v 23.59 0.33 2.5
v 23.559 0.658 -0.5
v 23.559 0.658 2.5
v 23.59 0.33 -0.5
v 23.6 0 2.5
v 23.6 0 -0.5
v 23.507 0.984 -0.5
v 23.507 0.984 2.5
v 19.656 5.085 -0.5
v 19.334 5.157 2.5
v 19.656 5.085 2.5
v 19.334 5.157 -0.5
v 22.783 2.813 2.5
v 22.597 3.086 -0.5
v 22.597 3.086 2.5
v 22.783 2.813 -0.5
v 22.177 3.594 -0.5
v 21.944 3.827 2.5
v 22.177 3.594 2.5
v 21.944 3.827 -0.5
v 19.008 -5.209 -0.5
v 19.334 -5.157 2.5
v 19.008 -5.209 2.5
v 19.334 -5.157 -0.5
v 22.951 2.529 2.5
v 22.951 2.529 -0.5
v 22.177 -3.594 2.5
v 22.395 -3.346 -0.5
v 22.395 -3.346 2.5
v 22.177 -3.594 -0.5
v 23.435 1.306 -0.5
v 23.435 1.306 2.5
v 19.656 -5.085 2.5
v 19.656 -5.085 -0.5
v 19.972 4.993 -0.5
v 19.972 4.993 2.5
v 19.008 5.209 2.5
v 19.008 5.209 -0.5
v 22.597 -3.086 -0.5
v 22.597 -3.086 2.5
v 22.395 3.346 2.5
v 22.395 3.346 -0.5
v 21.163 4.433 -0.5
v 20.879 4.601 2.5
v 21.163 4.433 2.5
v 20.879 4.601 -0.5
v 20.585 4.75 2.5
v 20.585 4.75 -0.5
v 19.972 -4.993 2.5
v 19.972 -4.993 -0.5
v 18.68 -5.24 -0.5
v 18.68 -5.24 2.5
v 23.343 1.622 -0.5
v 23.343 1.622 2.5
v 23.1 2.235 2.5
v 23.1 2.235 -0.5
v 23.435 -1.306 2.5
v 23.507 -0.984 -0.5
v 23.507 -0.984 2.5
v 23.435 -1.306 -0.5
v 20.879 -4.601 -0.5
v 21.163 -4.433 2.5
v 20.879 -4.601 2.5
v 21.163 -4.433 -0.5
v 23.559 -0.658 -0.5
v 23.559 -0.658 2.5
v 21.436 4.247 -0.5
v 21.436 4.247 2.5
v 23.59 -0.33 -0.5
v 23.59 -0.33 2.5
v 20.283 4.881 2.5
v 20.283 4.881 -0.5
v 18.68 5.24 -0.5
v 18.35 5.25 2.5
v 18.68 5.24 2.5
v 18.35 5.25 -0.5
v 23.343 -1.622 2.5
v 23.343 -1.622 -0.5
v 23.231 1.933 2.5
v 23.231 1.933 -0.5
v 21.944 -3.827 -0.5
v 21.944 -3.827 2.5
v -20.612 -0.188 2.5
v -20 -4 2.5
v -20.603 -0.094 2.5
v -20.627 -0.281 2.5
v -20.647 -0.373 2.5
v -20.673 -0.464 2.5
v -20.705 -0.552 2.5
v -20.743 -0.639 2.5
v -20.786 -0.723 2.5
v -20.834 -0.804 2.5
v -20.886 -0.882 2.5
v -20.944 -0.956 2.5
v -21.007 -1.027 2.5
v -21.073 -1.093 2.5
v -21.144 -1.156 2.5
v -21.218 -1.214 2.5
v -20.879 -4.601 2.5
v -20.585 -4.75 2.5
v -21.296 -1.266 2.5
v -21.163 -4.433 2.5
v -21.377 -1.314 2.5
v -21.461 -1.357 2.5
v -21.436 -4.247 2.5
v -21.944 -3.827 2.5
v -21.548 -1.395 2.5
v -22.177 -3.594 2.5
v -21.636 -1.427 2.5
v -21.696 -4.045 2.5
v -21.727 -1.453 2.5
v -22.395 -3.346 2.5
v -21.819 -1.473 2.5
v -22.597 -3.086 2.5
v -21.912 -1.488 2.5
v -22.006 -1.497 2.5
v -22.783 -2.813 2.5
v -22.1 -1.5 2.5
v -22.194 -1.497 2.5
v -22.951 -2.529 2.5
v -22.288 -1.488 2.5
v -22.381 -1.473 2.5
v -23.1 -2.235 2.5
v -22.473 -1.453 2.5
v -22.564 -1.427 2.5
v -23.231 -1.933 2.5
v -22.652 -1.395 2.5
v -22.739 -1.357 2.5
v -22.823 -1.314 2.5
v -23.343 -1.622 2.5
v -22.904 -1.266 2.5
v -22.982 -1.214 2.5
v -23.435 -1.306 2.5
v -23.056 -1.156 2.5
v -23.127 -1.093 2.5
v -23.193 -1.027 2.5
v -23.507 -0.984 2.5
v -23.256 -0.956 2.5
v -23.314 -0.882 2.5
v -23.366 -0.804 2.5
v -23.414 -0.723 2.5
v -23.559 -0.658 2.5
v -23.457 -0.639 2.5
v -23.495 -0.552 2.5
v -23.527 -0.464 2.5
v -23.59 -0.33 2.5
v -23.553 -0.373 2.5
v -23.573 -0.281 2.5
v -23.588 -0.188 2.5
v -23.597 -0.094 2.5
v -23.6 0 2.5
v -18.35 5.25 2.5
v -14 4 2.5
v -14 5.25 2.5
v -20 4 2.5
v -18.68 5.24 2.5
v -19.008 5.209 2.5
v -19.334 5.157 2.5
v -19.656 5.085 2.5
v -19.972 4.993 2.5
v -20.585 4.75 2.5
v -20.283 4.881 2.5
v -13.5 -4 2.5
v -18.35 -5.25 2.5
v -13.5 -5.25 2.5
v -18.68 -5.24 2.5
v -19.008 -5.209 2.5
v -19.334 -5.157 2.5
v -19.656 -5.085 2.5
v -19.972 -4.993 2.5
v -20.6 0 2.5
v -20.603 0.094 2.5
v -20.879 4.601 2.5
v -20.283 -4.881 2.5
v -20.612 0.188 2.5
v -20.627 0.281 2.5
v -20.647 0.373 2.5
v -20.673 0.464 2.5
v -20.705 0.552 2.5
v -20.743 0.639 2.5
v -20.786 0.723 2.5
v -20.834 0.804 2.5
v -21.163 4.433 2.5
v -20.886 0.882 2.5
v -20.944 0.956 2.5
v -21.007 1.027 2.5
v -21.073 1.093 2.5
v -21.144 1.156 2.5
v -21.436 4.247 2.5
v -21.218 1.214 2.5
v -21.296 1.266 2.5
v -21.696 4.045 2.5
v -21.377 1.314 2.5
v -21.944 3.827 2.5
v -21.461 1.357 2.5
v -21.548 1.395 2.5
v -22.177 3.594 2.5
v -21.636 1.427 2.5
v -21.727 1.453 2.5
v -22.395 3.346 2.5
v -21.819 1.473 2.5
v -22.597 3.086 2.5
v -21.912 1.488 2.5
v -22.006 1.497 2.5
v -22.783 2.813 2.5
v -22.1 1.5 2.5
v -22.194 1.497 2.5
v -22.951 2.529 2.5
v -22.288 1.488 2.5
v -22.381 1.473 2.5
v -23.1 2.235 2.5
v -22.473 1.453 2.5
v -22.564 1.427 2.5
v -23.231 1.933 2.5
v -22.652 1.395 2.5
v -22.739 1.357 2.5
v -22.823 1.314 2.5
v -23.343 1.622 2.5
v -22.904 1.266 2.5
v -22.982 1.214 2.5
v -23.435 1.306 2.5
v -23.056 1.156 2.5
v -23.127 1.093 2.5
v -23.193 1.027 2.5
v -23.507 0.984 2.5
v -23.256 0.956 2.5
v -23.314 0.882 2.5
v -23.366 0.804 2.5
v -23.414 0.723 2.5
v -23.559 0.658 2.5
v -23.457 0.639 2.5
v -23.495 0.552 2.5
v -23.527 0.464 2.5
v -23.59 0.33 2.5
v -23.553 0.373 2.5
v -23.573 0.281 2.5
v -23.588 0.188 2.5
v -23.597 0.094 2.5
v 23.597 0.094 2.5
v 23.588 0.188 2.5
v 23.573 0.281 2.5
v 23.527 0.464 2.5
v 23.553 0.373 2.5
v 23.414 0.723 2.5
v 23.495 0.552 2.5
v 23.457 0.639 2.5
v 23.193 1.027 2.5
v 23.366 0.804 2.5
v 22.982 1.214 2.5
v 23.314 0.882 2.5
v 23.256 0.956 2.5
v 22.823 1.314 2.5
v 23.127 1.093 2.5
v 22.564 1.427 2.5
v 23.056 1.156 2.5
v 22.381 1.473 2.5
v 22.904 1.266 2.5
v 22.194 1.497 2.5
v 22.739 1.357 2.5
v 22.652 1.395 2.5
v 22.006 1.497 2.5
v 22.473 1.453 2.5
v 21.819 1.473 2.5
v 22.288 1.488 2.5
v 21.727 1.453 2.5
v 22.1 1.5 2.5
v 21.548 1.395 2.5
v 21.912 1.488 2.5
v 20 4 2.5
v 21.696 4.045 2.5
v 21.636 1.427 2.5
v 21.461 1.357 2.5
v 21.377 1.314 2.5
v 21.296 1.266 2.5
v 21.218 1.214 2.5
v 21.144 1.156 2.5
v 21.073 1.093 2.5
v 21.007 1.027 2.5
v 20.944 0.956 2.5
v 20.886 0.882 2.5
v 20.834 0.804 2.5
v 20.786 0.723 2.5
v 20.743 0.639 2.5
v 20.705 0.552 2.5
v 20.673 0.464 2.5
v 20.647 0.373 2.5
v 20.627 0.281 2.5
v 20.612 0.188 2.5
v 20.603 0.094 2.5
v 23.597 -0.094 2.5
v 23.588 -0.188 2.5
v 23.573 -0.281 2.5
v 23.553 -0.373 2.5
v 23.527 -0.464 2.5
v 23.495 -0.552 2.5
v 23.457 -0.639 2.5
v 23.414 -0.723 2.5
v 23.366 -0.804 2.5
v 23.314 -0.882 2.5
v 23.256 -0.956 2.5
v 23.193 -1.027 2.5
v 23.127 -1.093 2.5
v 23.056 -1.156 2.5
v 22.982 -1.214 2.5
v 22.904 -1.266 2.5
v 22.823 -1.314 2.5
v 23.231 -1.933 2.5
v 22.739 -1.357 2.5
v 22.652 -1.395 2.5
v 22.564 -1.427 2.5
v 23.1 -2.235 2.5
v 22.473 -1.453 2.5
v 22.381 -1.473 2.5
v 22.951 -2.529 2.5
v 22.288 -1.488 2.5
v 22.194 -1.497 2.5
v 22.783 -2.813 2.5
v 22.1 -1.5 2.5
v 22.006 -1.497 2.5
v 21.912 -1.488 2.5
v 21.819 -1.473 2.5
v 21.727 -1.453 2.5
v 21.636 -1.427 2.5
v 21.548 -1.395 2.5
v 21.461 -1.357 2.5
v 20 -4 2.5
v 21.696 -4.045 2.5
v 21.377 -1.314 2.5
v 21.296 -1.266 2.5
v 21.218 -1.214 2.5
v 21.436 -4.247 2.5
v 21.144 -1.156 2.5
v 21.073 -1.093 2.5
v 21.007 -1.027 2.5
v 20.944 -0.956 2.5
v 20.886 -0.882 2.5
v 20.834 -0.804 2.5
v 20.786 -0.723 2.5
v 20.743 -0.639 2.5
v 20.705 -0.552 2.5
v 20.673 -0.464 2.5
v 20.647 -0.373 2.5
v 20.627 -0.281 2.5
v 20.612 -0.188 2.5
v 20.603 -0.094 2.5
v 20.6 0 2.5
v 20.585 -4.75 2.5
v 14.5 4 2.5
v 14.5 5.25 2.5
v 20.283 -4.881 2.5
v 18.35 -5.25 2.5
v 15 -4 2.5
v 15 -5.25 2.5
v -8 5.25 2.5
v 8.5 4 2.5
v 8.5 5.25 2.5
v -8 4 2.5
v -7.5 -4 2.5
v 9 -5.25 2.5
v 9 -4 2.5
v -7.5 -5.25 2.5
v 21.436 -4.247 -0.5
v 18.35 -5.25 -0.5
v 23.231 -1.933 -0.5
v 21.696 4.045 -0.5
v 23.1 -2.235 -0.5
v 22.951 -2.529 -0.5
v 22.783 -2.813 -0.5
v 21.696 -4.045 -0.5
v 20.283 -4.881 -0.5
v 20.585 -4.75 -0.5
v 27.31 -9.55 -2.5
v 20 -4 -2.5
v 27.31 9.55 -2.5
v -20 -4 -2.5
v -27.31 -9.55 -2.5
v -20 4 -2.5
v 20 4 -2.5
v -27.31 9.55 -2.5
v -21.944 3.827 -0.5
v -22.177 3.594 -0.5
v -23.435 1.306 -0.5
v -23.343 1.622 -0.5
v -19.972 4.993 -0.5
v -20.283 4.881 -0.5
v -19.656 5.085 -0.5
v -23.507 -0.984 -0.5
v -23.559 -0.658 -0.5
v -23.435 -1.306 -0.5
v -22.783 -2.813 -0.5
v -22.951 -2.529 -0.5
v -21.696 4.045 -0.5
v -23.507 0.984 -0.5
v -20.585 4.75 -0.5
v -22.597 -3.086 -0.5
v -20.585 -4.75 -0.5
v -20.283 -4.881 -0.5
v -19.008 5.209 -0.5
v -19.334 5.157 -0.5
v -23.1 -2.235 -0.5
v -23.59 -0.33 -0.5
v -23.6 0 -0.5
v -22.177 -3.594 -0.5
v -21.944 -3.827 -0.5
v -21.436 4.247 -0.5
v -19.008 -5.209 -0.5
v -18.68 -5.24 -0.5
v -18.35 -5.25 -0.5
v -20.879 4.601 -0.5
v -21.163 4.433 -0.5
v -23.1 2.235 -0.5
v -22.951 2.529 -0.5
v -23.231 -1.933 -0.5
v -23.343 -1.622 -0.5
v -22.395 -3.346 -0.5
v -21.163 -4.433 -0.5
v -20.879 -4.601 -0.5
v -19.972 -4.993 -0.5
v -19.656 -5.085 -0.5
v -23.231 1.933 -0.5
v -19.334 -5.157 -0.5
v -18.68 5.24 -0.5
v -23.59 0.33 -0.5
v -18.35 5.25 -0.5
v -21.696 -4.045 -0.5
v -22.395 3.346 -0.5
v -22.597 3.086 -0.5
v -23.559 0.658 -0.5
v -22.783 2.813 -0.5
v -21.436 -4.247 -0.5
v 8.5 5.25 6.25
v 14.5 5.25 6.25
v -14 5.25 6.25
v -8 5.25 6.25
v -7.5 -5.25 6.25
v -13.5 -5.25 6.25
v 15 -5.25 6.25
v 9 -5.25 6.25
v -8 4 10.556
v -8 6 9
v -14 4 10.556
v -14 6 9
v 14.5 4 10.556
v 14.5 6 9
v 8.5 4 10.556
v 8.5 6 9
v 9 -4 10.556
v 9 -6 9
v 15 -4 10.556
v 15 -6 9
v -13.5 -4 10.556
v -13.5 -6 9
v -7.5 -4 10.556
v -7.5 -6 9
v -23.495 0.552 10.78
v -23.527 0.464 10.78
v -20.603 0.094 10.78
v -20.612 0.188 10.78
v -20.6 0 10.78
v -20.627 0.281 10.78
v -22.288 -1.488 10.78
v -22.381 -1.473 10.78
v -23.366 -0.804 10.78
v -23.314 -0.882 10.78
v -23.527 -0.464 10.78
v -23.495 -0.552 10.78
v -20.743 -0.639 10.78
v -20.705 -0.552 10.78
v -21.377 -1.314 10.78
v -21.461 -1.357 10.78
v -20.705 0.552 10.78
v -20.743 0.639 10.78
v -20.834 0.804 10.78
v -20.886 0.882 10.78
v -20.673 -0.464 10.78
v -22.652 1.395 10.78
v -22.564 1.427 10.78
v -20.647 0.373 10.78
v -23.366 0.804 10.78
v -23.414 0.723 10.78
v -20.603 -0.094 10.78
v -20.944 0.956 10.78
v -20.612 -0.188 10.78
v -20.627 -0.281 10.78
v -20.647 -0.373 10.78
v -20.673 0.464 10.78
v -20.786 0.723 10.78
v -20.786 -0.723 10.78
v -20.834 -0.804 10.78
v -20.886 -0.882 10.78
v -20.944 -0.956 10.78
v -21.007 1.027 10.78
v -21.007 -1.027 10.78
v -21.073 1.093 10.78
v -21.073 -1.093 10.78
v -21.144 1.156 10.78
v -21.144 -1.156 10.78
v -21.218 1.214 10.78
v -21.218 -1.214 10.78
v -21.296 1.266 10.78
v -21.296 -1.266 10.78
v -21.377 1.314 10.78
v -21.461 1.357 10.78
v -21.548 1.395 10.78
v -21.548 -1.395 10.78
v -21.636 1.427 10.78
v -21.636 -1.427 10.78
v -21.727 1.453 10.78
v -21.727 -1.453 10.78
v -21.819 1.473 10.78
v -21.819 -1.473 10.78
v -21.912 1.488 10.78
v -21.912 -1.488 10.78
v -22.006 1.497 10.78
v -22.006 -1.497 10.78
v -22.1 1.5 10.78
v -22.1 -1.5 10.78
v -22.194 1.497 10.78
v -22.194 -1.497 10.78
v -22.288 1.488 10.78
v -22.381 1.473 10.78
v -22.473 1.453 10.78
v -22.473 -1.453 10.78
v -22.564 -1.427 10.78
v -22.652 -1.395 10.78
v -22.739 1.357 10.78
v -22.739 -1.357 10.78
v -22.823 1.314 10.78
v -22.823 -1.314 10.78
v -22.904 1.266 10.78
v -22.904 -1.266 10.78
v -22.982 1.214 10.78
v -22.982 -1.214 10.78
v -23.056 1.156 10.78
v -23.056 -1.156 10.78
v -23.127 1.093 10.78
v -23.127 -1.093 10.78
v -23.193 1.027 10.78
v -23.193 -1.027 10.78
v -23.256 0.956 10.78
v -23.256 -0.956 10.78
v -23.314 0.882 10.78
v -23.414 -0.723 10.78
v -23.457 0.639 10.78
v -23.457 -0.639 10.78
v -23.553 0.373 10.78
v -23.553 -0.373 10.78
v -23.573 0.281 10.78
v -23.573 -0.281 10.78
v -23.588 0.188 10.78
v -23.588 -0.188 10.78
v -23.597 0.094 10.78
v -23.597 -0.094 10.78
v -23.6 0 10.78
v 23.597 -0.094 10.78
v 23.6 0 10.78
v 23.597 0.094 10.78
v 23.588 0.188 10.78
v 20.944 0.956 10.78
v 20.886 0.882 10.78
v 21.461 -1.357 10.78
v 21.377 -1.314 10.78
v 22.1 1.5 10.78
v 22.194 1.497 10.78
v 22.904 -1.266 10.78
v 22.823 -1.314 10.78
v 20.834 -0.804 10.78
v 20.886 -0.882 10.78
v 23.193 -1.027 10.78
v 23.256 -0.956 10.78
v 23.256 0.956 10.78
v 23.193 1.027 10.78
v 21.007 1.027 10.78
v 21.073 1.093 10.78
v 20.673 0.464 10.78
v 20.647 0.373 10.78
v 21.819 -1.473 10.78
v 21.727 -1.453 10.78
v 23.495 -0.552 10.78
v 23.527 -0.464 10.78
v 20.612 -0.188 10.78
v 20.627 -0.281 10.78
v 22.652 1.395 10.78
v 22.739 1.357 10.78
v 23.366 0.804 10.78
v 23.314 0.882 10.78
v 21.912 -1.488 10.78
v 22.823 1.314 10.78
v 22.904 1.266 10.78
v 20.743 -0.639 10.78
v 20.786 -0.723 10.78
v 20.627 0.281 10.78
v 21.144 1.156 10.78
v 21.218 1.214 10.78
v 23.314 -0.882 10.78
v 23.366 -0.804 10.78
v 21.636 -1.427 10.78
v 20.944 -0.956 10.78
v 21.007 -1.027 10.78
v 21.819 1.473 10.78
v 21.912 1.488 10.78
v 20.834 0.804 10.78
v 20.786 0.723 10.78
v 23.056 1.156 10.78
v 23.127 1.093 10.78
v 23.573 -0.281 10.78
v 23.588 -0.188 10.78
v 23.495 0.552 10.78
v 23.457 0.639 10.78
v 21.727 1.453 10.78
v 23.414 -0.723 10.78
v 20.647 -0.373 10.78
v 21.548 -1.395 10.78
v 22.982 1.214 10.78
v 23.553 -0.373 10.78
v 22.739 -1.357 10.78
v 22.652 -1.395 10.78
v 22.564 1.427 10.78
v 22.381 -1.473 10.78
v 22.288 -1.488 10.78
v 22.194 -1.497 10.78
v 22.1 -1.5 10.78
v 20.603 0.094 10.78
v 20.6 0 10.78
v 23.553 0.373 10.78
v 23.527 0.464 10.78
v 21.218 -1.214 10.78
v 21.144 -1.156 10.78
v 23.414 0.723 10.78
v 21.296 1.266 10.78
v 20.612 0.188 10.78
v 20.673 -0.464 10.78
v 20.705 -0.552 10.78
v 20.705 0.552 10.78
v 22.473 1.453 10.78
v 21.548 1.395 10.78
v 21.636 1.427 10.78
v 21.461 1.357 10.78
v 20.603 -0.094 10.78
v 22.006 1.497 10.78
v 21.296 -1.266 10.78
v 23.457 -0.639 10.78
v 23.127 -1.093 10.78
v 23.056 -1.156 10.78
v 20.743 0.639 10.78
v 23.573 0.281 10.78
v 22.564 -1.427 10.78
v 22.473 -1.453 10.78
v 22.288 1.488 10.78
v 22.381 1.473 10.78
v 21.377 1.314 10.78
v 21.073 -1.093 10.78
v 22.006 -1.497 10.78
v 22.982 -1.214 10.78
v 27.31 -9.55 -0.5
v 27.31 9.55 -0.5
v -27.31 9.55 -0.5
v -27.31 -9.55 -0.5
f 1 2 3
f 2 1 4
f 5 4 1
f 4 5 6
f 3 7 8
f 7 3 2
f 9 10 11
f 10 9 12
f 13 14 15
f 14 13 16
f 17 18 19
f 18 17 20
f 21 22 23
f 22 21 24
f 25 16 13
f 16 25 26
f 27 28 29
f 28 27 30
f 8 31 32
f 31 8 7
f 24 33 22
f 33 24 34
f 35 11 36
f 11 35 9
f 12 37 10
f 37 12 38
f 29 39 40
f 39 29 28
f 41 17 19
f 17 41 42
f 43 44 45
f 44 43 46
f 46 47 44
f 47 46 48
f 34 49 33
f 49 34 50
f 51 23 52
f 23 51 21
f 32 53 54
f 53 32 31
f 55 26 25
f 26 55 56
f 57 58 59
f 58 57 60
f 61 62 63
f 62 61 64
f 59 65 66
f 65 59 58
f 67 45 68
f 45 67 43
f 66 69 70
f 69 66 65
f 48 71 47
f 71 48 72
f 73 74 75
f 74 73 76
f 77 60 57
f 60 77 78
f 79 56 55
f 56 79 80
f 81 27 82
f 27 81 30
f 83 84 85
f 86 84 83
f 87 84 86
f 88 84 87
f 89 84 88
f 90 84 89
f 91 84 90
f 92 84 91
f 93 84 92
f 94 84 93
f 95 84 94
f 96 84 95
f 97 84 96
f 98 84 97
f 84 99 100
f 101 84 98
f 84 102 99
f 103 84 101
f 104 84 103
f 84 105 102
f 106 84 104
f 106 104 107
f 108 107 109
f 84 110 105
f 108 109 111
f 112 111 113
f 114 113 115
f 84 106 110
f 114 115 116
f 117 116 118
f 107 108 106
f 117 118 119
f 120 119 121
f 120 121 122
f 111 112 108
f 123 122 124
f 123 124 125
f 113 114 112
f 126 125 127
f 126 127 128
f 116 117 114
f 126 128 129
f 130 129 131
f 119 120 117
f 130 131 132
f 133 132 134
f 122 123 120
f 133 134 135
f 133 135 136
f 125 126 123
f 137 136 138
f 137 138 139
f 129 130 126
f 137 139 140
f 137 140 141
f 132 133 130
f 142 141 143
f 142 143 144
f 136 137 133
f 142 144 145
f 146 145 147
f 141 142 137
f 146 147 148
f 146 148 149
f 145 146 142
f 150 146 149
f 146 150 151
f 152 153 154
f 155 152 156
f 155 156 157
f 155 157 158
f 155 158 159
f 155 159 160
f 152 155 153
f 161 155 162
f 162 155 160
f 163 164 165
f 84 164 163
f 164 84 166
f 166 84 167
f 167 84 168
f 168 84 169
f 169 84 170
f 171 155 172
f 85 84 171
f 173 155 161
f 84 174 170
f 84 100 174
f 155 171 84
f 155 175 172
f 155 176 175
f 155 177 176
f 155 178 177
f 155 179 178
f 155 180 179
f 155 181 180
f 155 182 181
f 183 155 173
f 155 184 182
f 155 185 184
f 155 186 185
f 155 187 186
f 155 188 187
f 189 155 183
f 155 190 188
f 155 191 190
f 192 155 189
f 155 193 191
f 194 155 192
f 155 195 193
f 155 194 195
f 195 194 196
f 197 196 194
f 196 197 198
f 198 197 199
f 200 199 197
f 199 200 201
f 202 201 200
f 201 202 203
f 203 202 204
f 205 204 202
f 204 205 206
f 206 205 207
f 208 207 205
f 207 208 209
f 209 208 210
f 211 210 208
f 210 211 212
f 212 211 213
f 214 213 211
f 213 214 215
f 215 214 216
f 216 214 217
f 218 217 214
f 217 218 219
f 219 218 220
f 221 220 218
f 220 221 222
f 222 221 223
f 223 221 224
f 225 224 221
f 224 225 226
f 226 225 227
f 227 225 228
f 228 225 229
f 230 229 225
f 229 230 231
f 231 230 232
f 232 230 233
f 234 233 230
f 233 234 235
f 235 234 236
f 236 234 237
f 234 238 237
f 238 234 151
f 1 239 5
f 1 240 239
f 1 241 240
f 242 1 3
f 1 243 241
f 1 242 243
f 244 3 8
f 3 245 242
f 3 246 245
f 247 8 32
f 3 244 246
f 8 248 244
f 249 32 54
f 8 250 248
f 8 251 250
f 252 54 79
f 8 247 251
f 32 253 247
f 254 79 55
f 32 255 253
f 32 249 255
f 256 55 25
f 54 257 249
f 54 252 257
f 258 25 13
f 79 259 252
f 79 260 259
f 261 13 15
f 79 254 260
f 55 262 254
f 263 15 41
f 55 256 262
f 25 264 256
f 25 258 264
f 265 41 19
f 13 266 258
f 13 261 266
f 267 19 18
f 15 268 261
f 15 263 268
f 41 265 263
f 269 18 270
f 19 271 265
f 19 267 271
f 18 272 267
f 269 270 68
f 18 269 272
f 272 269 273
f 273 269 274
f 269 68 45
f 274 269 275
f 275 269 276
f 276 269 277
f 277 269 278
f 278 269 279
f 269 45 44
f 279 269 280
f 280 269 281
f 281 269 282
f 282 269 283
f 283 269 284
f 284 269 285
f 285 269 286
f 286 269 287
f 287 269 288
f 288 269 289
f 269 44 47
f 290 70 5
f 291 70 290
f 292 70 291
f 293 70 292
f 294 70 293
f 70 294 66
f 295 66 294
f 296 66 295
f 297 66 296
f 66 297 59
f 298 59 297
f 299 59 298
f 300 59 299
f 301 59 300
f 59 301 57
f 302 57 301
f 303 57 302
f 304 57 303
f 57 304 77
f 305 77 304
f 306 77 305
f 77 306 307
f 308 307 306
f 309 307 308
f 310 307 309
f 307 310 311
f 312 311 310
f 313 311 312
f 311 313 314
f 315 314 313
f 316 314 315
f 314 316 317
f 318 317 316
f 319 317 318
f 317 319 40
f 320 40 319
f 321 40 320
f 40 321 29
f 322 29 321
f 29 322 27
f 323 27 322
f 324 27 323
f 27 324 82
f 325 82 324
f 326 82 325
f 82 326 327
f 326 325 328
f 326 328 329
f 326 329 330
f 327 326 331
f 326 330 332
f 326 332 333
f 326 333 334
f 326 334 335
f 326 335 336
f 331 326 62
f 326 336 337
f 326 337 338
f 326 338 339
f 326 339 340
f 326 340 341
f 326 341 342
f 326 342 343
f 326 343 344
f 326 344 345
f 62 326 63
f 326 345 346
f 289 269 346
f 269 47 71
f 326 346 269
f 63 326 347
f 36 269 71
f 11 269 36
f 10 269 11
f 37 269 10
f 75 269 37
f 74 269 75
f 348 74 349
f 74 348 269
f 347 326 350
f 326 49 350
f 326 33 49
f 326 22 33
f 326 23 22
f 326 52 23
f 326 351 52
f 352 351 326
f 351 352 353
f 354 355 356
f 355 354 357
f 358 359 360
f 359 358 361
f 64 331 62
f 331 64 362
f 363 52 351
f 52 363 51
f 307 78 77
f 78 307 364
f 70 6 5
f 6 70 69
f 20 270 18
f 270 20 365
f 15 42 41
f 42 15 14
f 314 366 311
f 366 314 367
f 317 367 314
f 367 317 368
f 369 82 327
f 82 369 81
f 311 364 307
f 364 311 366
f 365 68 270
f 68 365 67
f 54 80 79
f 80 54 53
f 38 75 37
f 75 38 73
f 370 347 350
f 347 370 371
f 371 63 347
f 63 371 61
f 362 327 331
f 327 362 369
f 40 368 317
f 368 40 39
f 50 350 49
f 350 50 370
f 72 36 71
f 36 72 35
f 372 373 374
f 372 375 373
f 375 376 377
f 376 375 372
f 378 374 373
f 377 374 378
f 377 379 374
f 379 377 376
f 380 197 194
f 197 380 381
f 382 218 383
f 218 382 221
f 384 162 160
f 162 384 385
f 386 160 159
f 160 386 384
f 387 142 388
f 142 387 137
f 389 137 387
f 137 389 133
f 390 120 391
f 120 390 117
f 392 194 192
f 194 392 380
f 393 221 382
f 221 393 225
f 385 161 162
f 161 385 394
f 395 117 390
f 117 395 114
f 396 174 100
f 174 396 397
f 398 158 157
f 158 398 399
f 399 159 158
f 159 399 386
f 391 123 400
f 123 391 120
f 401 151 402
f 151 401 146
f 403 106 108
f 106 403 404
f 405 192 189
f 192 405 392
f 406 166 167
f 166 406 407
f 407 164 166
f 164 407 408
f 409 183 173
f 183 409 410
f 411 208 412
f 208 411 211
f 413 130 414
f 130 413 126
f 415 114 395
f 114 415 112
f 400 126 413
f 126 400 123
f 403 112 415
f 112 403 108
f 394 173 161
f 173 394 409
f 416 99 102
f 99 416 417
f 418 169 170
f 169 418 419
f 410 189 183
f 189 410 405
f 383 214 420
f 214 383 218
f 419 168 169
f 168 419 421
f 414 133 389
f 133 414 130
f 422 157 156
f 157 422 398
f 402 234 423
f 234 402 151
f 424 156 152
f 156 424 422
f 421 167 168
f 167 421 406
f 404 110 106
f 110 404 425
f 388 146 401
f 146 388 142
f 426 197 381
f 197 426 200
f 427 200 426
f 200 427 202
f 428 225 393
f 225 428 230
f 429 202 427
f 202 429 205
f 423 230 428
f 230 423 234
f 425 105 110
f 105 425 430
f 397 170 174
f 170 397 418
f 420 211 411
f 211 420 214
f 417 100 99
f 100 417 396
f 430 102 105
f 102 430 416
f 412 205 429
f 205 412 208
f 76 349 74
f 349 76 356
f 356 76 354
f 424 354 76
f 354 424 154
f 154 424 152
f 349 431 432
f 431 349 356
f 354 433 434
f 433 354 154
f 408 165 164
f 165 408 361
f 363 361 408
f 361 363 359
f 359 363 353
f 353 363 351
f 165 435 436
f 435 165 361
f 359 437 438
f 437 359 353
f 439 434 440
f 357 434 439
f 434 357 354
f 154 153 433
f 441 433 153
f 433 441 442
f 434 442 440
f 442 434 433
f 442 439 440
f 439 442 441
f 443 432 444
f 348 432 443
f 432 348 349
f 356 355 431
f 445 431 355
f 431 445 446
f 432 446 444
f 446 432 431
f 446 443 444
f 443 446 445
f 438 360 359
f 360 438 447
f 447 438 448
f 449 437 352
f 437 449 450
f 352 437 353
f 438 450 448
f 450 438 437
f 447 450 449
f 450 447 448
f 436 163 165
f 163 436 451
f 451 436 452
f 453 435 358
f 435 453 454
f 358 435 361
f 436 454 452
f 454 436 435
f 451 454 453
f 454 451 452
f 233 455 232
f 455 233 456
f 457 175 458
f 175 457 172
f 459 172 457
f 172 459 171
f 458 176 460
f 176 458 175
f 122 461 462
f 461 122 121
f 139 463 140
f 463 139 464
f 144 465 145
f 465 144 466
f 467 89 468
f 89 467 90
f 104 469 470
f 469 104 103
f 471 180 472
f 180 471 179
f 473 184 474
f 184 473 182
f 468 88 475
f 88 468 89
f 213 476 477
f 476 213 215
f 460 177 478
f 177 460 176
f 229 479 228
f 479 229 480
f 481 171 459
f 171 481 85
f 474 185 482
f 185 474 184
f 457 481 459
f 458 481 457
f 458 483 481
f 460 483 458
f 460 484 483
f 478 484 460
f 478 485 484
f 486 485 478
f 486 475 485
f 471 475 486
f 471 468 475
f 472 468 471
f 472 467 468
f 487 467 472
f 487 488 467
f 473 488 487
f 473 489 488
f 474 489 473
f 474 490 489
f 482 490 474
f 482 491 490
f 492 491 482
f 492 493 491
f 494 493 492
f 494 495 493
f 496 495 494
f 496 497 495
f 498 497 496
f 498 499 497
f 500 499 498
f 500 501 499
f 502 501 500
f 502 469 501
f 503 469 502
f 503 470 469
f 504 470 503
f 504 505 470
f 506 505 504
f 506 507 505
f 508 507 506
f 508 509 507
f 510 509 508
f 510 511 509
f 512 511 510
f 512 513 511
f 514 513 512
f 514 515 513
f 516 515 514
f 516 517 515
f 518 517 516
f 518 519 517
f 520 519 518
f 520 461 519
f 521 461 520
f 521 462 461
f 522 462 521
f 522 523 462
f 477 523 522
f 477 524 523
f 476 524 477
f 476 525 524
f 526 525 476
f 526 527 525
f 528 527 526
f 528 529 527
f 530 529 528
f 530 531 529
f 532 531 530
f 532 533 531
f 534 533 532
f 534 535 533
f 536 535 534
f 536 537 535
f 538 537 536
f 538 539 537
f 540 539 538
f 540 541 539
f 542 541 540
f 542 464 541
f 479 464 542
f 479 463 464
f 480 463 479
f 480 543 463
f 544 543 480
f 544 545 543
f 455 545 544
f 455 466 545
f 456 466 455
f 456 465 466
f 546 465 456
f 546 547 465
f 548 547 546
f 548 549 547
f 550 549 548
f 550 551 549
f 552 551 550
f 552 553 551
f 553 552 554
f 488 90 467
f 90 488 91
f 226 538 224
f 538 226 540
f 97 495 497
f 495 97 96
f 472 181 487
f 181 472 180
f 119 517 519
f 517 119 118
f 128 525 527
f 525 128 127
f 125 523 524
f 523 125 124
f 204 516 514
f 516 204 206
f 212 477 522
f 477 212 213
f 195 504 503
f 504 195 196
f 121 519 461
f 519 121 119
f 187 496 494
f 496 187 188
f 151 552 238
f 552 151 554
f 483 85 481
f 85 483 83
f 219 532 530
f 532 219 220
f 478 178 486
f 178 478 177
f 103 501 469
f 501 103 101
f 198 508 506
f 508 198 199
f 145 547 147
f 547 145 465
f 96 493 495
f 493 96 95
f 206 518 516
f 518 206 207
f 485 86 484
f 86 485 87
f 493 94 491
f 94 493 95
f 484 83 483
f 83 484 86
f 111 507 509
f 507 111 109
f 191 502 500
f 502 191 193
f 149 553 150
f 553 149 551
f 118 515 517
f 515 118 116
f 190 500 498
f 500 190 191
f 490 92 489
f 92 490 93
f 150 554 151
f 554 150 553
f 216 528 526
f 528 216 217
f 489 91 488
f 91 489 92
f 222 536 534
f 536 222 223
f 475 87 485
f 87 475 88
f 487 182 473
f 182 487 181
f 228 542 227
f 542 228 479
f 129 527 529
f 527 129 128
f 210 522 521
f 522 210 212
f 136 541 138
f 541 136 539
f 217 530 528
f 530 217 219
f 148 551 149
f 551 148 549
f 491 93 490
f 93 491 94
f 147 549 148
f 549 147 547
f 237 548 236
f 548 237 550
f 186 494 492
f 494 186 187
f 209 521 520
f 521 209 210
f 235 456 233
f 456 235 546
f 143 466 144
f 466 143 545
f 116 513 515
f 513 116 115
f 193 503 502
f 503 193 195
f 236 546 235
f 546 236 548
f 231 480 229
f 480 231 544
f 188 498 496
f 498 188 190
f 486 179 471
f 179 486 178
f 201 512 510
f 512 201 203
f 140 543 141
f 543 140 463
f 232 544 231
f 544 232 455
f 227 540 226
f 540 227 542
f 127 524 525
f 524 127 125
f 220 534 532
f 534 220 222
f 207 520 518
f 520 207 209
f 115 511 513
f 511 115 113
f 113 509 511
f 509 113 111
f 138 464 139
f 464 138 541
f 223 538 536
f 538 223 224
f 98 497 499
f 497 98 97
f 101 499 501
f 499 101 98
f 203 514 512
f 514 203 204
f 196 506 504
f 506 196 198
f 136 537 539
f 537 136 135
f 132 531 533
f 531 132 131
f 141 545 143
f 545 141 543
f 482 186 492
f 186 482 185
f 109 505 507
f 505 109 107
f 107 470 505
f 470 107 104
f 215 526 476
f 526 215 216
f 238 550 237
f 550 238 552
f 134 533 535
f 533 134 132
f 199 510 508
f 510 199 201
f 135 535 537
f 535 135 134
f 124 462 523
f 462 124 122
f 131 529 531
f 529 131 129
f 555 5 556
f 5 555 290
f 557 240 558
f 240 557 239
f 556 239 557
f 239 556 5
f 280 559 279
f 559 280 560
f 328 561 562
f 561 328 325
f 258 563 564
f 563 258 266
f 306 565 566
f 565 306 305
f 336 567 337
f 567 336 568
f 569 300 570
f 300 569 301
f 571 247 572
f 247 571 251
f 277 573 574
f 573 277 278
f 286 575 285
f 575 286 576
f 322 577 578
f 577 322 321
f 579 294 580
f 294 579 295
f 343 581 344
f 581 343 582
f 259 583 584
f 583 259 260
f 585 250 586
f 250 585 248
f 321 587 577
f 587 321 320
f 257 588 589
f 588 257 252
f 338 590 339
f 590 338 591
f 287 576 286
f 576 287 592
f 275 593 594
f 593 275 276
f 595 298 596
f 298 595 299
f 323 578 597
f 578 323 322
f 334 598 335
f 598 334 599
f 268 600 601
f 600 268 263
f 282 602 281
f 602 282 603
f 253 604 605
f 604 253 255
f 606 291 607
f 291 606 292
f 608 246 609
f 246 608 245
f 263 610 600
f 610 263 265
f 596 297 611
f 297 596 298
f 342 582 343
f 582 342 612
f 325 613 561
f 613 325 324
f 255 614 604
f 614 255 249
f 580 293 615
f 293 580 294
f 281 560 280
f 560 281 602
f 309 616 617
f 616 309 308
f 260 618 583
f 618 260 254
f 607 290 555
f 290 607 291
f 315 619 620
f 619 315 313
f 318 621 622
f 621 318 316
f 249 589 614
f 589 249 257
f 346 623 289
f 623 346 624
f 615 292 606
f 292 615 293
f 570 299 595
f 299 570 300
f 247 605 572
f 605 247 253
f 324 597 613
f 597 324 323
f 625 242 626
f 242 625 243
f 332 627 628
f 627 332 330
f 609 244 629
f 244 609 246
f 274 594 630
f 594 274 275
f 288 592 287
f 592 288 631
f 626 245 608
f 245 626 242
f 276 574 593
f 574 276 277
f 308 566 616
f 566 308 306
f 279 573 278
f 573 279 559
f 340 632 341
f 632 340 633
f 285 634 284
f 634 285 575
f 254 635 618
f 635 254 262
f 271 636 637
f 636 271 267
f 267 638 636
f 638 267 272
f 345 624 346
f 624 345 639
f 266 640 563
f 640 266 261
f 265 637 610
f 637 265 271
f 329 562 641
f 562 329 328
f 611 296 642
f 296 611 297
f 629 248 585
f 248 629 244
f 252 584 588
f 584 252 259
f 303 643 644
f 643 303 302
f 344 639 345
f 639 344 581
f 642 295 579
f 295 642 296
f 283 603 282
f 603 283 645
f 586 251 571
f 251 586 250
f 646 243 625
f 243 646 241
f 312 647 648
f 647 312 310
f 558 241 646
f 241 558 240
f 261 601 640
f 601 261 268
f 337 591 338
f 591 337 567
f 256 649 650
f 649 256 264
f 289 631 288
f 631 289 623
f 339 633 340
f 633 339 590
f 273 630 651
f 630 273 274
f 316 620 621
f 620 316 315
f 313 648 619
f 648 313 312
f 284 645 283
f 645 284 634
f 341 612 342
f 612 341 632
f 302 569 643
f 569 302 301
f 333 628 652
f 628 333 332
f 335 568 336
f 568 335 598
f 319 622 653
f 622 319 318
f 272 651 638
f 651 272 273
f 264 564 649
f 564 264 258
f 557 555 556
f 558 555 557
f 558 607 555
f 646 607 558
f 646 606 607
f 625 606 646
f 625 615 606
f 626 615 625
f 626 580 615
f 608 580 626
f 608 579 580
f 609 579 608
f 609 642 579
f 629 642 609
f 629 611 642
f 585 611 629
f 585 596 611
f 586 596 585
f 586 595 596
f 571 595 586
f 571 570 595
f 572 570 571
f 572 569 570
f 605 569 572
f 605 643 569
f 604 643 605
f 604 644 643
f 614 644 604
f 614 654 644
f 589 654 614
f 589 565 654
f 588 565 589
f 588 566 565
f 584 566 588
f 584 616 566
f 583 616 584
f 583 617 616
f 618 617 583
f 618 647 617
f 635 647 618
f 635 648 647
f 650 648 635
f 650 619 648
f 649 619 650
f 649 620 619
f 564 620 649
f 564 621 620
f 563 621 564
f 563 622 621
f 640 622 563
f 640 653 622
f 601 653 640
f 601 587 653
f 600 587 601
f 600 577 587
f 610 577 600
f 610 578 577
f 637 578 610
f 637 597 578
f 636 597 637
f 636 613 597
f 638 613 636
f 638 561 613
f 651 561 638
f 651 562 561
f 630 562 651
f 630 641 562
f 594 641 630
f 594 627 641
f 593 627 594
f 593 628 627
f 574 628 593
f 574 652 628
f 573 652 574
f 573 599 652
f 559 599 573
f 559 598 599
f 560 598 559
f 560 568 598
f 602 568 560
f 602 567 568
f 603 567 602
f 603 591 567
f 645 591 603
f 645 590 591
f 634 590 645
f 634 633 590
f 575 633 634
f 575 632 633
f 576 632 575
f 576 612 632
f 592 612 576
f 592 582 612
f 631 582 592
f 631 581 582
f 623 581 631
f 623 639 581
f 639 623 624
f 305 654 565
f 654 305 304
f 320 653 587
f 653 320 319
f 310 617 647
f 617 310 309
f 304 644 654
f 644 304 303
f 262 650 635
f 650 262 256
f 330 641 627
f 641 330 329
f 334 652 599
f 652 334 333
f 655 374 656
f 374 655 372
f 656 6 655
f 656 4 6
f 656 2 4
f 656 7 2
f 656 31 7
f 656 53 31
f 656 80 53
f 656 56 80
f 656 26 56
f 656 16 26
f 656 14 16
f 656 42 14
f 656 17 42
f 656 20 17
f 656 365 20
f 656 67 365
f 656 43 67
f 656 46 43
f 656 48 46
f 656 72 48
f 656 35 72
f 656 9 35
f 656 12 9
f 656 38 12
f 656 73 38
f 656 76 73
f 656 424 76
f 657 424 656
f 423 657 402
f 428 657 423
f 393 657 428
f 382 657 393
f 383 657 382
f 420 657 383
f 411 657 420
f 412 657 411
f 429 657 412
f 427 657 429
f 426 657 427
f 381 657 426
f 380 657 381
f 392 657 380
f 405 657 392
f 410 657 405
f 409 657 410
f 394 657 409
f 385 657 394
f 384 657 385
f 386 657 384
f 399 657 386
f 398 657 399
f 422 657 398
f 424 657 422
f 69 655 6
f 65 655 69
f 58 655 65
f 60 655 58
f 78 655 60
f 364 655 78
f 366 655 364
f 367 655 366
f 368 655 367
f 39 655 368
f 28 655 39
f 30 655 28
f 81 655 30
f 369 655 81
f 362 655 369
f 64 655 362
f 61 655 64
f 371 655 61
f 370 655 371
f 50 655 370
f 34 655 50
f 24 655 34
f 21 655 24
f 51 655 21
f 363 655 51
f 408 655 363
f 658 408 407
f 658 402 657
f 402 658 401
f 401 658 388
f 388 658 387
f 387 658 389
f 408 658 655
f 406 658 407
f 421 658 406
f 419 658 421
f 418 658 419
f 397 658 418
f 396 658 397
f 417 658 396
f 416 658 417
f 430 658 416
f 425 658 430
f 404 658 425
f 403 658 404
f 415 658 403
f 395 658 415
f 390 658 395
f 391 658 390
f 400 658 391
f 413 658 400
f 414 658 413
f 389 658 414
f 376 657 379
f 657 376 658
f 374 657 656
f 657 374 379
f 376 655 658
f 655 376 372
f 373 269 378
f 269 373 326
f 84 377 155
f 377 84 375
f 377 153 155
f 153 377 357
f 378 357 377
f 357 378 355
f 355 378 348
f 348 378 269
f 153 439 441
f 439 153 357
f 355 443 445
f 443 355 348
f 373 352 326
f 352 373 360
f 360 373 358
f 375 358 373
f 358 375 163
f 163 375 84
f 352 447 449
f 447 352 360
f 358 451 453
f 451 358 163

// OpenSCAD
innerHeight = 10.50;
innerWidth = 47.20;
outerHeight = 19.10;
outerWidth = 54.62;
postHeight=5+8.28;

difference() {
    union() {
        innerPlug();
        
        //corner posts
        cornerRadius=1.5;
        
        translate([-innerWidth/2 + cornerRadius, 0, -2.5])
        cylinder(postHeight, r=cornerRadius, $fn=100);
        
        translate([innerWidth/2 - cornerRadius, 0, -2.5])
        cylinder(postHeight, r=cornerRadius, $fn=100);
        
        //tabs
        translate([-14, innerHeight/2-1.5, -2.5])
        tab();
        
        translate([8.5, innerHeight/2-1.5, -2.5])
        tab();
        
        rotate([0, 0, 180])
        translate([-15, innerHeight/2-1.5, -2.5])
        tab();
        
        rotate([0, 0, 180])
        translate([7.5, innerHeight/2-1.5, -2.5])
        tab();
        
        //outside facet
        translate([0, 0, -1.5])
        cube([outerWidth, outerHeight, 2], center=true);
    }
    
    cube([40, 8, 50], center=true);
}

module tab() {
    tabWidth=6;
    union() {
        cube([tabWidth, 1.5, postHeight-3]);
        
        translate([0, 1.5, 13.25])
        rotate([0, 90, 0])
        linear_extrude(tabWidth)
        polygon(points=[[0, -1.5],[1.75, 0.75],[10, -1.5]], paths=[[0,1,2]]);
    }
}

module innerPlug() {
    union() {
        radius = innerHeight/2;
        translate([innerWidth/2 - radius, 0, 0])
        cylinder(5, d=innerHeight, center=true, $fn=100);

        translate([-innerWidth/2 + radius, 0, 0])
        cylinder(5, d=innerHeight, center=true, $fn=100);
        
        translate([-innerWidth/2 + radius, -innerHeight/2, -2.5])
        cube([innerWidth-innerHeight, innerHeight, 5]);
    }
}
